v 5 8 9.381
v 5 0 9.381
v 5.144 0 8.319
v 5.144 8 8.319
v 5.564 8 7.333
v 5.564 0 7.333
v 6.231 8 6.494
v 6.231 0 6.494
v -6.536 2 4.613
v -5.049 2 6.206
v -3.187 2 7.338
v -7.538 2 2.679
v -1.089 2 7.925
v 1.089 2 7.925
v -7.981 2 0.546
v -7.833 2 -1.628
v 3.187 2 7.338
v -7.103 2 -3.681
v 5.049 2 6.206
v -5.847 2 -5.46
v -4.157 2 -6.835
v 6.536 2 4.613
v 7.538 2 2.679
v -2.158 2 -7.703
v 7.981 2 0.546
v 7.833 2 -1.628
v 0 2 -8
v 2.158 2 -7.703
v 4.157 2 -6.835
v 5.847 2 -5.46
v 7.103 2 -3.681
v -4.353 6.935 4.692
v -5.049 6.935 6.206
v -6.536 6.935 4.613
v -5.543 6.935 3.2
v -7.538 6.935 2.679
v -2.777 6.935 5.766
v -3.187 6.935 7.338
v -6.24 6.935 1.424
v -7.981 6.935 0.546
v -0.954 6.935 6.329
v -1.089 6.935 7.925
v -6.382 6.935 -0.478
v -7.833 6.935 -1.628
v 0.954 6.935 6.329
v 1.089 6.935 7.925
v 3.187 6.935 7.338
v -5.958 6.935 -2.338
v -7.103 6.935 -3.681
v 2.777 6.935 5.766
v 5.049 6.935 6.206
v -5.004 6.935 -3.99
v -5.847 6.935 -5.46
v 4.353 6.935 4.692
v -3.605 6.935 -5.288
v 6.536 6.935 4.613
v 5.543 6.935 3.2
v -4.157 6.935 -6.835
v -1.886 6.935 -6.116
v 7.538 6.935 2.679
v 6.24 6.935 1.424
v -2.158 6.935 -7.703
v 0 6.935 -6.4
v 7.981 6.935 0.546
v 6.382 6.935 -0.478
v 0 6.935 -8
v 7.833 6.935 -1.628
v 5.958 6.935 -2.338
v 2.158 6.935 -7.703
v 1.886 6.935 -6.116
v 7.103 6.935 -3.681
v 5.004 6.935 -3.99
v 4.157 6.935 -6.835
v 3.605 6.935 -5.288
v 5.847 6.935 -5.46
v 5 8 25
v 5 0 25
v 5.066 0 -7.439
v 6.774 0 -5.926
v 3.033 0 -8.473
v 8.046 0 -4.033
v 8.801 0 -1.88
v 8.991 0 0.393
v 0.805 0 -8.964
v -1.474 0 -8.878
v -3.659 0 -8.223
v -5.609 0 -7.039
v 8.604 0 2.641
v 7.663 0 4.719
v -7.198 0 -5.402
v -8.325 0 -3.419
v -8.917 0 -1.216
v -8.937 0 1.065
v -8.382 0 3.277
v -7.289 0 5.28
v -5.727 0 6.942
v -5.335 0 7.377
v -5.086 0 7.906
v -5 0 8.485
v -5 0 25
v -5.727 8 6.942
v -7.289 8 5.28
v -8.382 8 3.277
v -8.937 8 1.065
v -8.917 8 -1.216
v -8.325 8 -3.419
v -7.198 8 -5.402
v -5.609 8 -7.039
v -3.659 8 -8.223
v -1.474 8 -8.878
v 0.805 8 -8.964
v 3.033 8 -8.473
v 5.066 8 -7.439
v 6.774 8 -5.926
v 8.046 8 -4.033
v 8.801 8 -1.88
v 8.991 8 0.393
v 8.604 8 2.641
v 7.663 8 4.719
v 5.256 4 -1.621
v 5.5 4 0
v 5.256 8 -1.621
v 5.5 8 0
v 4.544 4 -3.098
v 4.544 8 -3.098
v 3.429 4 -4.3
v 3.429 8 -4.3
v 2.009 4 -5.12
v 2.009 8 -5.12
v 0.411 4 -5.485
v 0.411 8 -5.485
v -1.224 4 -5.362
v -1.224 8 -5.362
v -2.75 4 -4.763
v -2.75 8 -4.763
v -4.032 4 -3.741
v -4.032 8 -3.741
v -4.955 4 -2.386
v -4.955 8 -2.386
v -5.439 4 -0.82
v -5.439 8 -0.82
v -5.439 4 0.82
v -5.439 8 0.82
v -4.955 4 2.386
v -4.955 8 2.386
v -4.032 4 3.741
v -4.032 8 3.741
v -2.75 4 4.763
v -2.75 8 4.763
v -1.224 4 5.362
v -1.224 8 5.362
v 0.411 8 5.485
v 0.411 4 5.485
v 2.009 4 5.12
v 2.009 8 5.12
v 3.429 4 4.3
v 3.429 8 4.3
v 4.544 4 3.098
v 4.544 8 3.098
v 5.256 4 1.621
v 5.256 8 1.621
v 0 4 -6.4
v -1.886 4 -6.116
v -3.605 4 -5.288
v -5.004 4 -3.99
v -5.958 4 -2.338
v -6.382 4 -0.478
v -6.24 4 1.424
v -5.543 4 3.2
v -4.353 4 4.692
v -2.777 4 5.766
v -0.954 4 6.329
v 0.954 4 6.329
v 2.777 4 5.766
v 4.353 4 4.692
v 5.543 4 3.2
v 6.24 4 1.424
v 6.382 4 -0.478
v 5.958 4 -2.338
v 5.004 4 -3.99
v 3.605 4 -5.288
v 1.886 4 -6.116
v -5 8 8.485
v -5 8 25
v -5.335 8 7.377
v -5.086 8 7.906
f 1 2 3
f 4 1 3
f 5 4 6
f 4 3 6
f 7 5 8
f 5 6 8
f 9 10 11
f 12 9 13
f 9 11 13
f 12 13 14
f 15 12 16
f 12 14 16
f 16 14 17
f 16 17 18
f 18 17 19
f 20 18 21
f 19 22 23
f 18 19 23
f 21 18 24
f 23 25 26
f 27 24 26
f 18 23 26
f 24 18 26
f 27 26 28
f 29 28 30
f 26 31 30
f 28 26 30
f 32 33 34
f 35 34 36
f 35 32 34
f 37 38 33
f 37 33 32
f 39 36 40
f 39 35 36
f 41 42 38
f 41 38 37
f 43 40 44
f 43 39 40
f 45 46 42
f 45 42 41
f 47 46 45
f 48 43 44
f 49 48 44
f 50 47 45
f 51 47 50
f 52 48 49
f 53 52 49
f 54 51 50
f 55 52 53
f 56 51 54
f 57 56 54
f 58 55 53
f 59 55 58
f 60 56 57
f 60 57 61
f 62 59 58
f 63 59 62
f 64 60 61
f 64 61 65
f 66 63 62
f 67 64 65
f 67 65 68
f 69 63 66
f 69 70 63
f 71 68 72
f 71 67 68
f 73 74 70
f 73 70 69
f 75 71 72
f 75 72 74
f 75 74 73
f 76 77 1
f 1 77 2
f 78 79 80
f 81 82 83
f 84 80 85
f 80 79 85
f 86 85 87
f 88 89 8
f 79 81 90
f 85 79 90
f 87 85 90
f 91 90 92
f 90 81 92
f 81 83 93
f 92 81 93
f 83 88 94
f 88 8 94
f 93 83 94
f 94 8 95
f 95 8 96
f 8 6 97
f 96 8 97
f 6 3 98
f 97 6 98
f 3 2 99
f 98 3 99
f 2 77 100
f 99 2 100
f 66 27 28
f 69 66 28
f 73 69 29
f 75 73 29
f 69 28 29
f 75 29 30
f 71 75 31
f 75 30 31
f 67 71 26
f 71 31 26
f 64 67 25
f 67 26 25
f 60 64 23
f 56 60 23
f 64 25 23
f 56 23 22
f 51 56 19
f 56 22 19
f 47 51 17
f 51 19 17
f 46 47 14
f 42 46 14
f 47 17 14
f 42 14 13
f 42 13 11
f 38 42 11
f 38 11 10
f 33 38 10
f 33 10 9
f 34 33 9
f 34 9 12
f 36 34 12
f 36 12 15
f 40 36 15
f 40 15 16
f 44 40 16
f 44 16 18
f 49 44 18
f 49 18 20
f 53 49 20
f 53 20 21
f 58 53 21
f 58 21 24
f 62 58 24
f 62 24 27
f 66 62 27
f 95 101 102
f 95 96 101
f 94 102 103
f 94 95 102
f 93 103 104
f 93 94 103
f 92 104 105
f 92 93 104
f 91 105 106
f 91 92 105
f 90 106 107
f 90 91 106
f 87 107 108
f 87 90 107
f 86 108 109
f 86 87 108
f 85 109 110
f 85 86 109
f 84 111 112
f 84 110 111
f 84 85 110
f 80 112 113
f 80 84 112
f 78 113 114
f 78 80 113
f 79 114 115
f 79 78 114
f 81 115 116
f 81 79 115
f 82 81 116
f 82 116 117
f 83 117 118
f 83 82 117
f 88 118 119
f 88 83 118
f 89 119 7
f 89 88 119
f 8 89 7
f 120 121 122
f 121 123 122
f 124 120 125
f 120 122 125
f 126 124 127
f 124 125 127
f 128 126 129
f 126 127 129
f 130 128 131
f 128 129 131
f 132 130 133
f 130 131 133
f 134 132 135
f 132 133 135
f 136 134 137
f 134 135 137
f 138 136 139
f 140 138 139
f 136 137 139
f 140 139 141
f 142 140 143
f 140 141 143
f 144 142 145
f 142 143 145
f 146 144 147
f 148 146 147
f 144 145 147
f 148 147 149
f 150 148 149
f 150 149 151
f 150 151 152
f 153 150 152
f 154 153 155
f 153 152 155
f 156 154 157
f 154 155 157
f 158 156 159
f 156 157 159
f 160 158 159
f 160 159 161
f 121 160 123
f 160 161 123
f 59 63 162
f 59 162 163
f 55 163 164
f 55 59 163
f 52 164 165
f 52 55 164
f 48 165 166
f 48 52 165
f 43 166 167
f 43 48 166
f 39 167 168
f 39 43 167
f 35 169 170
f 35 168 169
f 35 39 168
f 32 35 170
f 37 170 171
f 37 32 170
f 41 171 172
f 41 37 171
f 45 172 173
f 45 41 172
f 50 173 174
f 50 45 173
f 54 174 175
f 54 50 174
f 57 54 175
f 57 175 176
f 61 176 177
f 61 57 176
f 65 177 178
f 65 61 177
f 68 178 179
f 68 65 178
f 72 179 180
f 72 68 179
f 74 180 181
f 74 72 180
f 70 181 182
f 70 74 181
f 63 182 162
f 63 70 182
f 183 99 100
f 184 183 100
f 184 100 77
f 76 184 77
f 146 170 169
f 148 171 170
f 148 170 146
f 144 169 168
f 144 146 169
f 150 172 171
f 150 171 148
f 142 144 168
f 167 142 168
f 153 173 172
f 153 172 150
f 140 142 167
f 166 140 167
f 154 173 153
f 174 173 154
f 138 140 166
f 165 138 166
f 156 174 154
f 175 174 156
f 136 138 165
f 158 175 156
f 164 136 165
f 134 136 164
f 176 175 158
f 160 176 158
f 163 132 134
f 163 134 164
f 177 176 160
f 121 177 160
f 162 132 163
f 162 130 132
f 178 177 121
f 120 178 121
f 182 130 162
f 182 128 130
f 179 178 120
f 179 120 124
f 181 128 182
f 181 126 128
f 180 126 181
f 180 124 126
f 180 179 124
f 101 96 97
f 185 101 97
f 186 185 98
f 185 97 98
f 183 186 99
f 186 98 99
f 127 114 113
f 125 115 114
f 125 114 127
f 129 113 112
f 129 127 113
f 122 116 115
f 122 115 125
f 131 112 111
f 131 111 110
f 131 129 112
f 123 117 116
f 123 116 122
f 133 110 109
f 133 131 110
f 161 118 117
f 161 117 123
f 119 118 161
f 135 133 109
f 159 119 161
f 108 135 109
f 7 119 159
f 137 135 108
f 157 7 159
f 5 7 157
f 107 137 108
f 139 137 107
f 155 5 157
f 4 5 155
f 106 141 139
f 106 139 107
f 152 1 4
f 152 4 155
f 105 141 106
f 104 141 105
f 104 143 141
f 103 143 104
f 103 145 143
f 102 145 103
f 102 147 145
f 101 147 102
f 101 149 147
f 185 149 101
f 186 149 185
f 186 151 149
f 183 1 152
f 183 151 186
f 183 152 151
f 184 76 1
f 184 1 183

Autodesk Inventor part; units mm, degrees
ref_plane "YZ Plane" through (0, 0, 0) normal (1, 0, 0) x (0, 1, 0)
ref_plane "XZ Plane" through (0, 0, 0) normal (0, 1, 0) x (-1, 0, 0)
ref_plane "XY Plane" through (0, 0, 0) normal (0, 0, 1) x (1, 0, 0)
sketch "Skizze1" plane through (0, 0, 0) normal (0, 1, 0) x (-1, 0, 0)
  line L0 (5, 25) -> (-5, 25)
  line L1 (-5, 25) -> (-5, 9.3808)
  line L2 (5, 8.4853) -> (5, 25)
  arc A0 (-6.2308, 6.4944) -> (5.7273, 6.9425) centre (0, 0) ccw
  arc A1 (5, 8.4853) -> (5.7273, 6.9425) centre (7, 8.4853) ccw
  arc A2 (-6.2308, 6.4944) -> (-5, 9.3808) centre (-9, 9.3808) ccw
  line L3 (0, -16.1968) -> (0, 31.8661) projected
  point P0 (0, 0)
  point P1 (-5, 7.4833)
  point P2 (5, 7.4833)
  dimension "d2" = 18
  dimension "d3" = 5
  dimension "d4" = 2
  dimension "d5" = 4
  dimension "d8" = 10
  dimension "d9" = 5
  dimension "d10" = 0
  dimension "d11" = 25
extrude "Extrusion1" add sketch "Skizze1" along normal blind 8
sketch "Skizze3" plane through (0, 8, 0) normal (0, 1, 0) x (1, 0, 0)
  circle A0 centre (0, 0) radius 5.5
  dimension "d12" = 11
extrude "Extrusion2" cut sketch "Skizze3" against normal blind 6
sketch "Skizze5" plane through (0, 0, 0) normal (1, 0, 0) x (0, 1, 0)
  line L0 (4, 0) -> (2, 0)
  line L1 (2, 0) -> (2, -8)
  line L2 (4, -6.4) -> (4, 0)
  line L3 (2, 5.5) -> (2, -5.5) projected
  line L4 (4, -6.4) -> (6.9352, -6.4)
  line L5 (6.9352, -6.4) -> (6.9352, -8)
  line L6 (6.9352, -8) -> (2, -8)
  line L7 (-1.387, 0) -> (8.3222, 0) projected
  point P0 (0, 0)
  point P1 (3, 0)
  point P2 (5.4676, -6.4)
  dimension "d21" = 0
  dimension "d22" = 2
  dimension "d26" = 8
  dimension "d27" = 6.4
revolve "Umdrehung1" cut sketch "Skizze5" angle 360 about axis through (0, 4, 0) along (0, -1, 0)
properties part number "alternativeJoint"
